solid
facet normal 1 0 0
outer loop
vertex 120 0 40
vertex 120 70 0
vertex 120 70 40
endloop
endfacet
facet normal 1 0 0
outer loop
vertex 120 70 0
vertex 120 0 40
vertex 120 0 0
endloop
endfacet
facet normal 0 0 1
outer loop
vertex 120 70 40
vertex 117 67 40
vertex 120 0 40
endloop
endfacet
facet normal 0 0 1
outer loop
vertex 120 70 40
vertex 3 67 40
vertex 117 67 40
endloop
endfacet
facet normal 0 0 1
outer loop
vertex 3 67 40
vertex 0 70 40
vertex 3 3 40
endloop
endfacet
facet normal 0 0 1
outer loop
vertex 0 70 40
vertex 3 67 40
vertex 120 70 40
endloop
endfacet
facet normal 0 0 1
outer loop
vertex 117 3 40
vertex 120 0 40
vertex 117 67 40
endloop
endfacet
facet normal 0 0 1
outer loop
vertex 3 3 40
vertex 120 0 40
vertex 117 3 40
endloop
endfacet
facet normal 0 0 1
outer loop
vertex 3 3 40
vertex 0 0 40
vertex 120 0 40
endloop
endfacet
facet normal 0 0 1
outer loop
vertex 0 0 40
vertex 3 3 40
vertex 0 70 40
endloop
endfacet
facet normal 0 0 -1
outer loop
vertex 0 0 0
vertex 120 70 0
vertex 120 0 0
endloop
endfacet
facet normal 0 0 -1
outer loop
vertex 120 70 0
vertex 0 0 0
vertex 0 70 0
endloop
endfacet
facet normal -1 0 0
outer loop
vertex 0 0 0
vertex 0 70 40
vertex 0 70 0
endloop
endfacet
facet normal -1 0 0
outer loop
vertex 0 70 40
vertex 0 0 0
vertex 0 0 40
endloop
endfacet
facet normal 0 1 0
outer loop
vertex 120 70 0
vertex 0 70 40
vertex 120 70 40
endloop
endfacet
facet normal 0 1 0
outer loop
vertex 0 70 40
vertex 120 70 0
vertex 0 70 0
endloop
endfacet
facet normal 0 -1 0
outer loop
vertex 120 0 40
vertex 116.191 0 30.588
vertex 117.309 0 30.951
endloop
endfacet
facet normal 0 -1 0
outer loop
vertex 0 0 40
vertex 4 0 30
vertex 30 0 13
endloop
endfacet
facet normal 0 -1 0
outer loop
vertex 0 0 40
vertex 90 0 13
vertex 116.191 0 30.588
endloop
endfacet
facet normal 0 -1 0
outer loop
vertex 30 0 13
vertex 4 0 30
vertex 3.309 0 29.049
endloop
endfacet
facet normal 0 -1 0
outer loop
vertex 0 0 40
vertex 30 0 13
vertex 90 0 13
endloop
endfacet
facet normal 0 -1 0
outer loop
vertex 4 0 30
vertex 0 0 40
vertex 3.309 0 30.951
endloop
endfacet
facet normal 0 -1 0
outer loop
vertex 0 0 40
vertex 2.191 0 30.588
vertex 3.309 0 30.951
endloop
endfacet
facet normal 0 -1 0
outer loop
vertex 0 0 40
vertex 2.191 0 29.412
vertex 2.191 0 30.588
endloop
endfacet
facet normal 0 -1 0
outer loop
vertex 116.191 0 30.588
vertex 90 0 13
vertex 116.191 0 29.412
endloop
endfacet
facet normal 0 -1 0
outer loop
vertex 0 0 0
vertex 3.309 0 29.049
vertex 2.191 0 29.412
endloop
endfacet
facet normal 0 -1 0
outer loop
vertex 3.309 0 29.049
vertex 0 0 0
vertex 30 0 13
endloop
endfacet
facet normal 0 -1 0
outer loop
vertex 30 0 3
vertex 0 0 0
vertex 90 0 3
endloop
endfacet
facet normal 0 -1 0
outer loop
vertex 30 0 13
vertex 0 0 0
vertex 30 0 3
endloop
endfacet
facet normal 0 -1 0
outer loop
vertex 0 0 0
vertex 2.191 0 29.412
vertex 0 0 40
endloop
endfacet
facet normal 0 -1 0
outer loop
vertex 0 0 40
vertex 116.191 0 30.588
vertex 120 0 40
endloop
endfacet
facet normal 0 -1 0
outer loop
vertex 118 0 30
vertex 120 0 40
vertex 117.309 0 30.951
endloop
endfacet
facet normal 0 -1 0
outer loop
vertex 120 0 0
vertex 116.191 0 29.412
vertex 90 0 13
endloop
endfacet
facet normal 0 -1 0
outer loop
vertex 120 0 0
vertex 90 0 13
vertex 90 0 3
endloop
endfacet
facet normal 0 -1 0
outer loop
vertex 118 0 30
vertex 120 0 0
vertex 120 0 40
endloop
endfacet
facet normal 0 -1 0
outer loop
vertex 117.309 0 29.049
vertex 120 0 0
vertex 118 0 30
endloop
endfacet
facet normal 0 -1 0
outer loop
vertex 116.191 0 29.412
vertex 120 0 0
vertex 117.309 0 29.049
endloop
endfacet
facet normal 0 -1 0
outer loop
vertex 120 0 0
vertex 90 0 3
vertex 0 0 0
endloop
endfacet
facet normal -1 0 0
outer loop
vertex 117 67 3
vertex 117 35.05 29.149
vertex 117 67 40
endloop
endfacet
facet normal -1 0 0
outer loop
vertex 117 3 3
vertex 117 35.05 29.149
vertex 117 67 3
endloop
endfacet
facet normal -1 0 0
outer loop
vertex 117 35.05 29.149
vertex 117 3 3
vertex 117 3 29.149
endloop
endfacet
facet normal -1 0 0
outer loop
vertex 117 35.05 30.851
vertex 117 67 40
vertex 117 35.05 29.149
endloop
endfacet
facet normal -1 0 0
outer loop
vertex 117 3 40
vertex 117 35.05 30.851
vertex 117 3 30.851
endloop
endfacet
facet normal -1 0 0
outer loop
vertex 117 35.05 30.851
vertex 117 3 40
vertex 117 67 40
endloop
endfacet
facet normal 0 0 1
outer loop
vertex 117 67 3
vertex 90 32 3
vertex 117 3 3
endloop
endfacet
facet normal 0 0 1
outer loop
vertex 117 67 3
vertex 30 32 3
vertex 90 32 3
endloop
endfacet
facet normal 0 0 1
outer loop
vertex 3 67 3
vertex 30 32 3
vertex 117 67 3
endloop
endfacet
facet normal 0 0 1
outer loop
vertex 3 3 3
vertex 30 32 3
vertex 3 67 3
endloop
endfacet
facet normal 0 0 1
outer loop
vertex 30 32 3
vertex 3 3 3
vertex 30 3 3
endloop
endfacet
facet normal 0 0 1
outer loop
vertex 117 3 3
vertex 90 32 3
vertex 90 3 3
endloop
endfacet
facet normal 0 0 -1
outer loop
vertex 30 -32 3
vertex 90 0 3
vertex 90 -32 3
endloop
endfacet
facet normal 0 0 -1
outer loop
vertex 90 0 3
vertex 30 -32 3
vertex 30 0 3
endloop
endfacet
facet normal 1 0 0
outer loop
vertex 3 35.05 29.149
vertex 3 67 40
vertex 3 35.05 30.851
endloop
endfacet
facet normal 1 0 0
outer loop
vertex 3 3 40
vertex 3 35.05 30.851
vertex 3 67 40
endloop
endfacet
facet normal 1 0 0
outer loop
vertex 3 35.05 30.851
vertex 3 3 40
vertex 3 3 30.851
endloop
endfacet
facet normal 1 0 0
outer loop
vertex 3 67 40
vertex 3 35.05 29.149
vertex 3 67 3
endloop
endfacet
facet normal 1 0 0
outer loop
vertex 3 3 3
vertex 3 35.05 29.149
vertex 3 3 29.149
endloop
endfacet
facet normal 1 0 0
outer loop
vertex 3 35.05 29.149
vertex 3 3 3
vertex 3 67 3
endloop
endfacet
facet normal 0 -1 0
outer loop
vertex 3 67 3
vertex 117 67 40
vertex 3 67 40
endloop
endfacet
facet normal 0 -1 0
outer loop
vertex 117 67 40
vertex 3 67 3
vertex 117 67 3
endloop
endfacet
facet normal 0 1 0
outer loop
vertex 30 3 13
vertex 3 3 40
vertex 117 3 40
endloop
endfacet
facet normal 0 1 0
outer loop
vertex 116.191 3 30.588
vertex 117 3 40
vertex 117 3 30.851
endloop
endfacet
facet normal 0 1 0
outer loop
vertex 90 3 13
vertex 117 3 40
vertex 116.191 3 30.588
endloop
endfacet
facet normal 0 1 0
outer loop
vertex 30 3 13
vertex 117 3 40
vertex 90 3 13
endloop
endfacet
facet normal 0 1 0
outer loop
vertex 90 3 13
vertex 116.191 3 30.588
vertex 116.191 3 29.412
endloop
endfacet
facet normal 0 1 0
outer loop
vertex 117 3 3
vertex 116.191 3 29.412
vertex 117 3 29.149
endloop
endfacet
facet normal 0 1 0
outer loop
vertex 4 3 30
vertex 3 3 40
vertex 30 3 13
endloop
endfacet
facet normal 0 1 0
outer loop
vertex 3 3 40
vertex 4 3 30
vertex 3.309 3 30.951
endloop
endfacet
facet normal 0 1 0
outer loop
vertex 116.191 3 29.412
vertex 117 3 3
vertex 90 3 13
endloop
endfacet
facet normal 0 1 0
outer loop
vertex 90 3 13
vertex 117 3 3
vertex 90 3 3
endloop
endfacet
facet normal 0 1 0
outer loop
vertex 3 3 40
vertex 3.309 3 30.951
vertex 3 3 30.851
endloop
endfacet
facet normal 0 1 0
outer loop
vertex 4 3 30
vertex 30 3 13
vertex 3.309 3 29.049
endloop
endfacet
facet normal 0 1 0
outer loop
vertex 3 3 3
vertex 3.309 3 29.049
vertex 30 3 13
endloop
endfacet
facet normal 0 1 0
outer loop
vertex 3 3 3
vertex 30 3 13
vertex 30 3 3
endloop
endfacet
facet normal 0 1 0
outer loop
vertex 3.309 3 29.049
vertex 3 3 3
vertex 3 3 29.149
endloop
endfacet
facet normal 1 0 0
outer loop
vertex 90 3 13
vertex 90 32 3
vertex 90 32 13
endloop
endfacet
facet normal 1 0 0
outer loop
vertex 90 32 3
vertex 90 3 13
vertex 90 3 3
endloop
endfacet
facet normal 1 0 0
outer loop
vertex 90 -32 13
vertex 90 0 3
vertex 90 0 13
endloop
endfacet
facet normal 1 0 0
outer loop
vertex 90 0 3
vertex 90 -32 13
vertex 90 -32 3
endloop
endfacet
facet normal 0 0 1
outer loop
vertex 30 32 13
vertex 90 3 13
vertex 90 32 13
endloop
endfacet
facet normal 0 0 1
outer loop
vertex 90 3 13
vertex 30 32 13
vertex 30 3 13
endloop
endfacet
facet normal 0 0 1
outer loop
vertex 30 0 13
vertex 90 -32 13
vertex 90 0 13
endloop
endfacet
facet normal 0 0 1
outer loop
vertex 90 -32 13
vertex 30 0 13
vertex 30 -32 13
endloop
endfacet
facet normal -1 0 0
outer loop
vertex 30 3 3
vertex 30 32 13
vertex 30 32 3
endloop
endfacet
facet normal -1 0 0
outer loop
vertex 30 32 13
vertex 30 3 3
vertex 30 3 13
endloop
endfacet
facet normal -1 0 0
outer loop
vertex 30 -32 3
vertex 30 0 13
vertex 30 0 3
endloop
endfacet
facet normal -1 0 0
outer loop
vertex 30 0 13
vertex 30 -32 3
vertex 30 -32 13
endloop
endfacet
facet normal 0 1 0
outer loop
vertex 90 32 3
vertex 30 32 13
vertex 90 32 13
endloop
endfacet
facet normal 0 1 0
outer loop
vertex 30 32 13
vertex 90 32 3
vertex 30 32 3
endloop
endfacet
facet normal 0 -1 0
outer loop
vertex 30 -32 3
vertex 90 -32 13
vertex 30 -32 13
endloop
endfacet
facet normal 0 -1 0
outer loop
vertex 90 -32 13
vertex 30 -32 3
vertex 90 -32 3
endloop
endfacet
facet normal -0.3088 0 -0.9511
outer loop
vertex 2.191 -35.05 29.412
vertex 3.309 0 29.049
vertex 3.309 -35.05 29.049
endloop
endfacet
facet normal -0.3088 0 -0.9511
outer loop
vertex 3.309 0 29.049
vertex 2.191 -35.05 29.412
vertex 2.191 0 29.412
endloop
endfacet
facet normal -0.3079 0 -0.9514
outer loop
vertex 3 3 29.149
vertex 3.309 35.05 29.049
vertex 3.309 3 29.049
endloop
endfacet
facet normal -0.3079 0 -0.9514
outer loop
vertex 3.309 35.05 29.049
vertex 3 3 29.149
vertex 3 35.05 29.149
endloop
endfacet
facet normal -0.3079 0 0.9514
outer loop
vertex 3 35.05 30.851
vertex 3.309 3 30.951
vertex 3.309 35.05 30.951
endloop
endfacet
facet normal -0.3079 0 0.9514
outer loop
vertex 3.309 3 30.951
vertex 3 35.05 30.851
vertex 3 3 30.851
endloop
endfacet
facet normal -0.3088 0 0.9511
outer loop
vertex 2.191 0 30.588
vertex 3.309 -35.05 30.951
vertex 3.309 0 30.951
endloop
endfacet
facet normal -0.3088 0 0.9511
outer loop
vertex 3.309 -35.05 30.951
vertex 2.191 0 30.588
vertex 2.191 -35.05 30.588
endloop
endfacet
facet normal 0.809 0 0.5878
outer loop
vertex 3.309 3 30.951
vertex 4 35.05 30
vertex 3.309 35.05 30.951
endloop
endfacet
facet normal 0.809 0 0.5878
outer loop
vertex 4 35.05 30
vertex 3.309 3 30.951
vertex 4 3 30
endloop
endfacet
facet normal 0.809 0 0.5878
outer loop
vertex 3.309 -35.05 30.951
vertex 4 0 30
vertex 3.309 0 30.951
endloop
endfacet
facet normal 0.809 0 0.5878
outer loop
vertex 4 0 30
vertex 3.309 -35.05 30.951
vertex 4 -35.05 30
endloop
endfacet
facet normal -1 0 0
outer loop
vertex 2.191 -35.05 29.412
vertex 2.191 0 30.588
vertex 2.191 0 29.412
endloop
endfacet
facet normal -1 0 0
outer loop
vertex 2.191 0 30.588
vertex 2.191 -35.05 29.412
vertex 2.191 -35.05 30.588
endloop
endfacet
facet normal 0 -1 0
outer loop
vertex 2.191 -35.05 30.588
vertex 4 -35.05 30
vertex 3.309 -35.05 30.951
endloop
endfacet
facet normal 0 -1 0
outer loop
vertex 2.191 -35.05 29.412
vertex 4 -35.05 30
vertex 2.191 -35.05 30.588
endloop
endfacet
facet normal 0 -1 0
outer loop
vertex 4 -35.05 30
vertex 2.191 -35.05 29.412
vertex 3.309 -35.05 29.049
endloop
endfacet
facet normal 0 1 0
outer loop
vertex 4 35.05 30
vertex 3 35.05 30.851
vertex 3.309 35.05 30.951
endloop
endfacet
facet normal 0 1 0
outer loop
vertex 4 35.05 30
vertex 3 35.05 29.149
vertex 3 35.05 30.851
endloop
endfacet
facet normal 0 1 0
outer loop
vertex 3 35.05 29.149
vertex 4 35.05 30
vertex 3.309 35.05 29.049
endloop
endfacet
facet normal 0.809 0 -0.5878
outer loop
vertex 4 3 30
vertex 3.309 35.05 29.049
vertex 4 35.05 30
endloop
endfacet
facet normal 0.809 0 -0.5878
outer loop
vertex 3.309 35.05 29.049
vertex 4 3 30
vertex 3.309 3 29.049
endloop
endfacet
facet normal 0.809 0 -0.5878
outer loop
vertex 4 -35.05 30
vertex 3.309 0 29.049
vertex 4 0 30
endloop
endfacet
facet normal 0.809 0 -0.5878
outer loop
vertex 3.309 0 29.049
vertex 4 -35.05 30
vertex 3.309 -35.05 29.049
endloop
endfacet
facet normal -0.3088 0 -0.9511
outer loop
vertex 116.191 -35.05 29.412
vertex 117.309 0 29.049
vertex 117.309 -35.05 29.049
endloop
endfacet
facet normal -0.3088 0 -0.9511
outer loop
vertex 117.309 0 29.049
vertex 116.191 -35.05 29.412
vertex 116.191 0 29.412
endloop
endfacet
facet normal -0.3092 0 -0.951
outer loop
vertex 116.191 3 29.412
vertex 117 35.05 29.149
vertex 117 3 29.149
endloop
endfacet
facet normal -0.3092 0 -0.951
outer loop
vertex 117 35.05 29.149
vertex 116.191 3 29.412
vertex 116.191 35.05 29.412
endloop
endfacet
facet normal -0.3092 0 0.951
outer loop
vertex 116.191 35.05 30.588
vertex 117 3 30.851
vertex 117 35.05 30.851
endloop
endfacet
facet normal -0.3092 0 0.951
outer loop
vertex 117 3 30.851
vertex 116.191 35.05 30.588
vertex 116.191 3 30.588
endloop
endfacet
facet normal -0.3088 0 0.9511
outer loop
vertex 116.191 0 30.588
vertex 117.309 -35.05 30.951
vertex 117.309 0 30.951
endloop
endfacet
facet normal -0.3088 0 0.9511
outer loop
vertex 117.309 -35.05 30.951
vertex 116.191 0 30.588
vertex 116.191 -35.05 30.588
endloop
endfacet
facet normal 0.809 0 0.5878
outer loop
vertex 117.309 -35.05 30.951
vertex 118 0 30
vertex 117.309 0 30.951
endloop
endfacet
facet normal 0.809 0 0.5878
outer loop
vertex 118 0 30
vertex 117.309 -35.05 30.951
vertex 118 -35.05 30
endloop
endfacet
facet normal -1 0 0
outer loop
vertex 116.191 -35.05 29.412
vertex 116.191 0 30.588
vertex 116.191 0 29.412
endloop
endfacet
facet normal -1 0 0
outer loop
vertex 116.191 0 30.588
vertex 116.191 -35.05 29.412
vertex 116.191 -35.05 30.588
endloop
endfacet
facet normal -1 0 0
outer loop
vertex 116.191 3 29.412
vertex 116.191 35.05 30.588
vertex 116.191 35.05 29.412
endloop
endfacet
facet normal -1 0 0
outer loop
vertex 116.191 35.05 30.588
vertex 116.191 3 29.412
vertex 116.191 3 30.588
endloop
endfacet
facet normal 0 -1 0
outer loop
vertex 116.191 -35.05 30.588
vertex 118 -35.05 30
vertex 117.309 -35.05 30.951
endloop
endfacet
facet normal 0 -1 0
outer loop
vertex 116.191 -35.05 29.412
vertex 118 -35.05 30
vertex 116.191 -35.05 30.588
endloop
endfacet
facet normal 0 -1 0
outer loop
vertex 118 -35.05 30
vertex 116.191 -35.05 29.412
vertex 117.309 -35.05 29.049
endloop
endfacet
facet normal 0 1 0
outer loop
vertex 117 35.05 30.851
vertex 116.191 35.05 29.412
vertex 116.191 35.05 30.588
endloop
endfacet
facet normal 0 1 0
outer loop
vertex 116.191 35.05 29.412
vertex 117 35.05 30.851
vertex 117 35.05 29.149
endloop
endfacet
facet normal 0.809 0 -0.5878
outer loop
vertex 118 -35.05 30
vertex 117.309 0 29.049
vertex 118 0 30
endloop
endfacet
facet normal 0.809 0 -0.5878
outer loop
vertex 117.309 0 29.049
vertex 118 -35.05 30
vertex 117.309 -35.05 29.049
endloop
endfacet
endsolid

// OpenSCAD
// --- Buffer tank for mini horizontal gel-electrophoresis box ---
// Print orientation: resting on XY plane at z = 0, building upward (+Z)
// Centre on origin in X and Y

// Outer dimensions
outer_x = 120;       // mm, outer length in X
outer_y = 70;         // mm, outer width in Y
outer_z = 40;         // mm, outer height in Z

// Wall and floor thickness
wall_thick = 3;       // mm, wall thickness
floor_thick = 3;      // mm, floor thickness

// Gel platform
platform_length = 60; // mm, length in X (centred)
platform_top_z = 13;  // mm, top of platform above inner floor (z = 13)
platform_thickness = platform_top_z - floor_thick; // 10 mm thick platform

// Electrode wire holes
wire_hole_dia = 2;    // mm, diameter of wire holes
wire_hole_z = 30;     // mm, height of wire holes

// Inner dimensions
inner_x = outer_x - 2 * wall_thick;
inner_y = outer_y - 2 * wall_thick;

// Platform half-lengths
plat_half_x = platform_length / 2;

// Build the tank
module tank() {
    union() {
        // Tank walls and floor (hollow box, open at top)
        difference() {
            // Outer block
            cube([outer_x, outer_y, outer_z], center = false);
            
            // Inner cavity (open at top)
            translate([wall_thick, wall_thick, floor_thick]) {
                cube([inner_x, inner_y, outer_z - floor_thick], center = false);
            }
        }
        
        // Gel platform (solid, centered in Y)
        translate([outer_x/2 - plat_half_x, -inner_y/2, floor_thick]) {
            cube([platform_length, inner_y, platform_thickness], center = false);
        }
    }
    
    // Drill electrode wire holes through end walls (X ends) at y = 0
    for (x_pos = [wall_thick, outer_x - wall_thick]) {
        translate([x_pos, 0, wire_hole_z]) {
            rotate([90, 0, 0]) {
                cylinder(d = wire_hole_dia, h = outer_y + 0.1, center = true);
            }
        }
    }
}

tank();
